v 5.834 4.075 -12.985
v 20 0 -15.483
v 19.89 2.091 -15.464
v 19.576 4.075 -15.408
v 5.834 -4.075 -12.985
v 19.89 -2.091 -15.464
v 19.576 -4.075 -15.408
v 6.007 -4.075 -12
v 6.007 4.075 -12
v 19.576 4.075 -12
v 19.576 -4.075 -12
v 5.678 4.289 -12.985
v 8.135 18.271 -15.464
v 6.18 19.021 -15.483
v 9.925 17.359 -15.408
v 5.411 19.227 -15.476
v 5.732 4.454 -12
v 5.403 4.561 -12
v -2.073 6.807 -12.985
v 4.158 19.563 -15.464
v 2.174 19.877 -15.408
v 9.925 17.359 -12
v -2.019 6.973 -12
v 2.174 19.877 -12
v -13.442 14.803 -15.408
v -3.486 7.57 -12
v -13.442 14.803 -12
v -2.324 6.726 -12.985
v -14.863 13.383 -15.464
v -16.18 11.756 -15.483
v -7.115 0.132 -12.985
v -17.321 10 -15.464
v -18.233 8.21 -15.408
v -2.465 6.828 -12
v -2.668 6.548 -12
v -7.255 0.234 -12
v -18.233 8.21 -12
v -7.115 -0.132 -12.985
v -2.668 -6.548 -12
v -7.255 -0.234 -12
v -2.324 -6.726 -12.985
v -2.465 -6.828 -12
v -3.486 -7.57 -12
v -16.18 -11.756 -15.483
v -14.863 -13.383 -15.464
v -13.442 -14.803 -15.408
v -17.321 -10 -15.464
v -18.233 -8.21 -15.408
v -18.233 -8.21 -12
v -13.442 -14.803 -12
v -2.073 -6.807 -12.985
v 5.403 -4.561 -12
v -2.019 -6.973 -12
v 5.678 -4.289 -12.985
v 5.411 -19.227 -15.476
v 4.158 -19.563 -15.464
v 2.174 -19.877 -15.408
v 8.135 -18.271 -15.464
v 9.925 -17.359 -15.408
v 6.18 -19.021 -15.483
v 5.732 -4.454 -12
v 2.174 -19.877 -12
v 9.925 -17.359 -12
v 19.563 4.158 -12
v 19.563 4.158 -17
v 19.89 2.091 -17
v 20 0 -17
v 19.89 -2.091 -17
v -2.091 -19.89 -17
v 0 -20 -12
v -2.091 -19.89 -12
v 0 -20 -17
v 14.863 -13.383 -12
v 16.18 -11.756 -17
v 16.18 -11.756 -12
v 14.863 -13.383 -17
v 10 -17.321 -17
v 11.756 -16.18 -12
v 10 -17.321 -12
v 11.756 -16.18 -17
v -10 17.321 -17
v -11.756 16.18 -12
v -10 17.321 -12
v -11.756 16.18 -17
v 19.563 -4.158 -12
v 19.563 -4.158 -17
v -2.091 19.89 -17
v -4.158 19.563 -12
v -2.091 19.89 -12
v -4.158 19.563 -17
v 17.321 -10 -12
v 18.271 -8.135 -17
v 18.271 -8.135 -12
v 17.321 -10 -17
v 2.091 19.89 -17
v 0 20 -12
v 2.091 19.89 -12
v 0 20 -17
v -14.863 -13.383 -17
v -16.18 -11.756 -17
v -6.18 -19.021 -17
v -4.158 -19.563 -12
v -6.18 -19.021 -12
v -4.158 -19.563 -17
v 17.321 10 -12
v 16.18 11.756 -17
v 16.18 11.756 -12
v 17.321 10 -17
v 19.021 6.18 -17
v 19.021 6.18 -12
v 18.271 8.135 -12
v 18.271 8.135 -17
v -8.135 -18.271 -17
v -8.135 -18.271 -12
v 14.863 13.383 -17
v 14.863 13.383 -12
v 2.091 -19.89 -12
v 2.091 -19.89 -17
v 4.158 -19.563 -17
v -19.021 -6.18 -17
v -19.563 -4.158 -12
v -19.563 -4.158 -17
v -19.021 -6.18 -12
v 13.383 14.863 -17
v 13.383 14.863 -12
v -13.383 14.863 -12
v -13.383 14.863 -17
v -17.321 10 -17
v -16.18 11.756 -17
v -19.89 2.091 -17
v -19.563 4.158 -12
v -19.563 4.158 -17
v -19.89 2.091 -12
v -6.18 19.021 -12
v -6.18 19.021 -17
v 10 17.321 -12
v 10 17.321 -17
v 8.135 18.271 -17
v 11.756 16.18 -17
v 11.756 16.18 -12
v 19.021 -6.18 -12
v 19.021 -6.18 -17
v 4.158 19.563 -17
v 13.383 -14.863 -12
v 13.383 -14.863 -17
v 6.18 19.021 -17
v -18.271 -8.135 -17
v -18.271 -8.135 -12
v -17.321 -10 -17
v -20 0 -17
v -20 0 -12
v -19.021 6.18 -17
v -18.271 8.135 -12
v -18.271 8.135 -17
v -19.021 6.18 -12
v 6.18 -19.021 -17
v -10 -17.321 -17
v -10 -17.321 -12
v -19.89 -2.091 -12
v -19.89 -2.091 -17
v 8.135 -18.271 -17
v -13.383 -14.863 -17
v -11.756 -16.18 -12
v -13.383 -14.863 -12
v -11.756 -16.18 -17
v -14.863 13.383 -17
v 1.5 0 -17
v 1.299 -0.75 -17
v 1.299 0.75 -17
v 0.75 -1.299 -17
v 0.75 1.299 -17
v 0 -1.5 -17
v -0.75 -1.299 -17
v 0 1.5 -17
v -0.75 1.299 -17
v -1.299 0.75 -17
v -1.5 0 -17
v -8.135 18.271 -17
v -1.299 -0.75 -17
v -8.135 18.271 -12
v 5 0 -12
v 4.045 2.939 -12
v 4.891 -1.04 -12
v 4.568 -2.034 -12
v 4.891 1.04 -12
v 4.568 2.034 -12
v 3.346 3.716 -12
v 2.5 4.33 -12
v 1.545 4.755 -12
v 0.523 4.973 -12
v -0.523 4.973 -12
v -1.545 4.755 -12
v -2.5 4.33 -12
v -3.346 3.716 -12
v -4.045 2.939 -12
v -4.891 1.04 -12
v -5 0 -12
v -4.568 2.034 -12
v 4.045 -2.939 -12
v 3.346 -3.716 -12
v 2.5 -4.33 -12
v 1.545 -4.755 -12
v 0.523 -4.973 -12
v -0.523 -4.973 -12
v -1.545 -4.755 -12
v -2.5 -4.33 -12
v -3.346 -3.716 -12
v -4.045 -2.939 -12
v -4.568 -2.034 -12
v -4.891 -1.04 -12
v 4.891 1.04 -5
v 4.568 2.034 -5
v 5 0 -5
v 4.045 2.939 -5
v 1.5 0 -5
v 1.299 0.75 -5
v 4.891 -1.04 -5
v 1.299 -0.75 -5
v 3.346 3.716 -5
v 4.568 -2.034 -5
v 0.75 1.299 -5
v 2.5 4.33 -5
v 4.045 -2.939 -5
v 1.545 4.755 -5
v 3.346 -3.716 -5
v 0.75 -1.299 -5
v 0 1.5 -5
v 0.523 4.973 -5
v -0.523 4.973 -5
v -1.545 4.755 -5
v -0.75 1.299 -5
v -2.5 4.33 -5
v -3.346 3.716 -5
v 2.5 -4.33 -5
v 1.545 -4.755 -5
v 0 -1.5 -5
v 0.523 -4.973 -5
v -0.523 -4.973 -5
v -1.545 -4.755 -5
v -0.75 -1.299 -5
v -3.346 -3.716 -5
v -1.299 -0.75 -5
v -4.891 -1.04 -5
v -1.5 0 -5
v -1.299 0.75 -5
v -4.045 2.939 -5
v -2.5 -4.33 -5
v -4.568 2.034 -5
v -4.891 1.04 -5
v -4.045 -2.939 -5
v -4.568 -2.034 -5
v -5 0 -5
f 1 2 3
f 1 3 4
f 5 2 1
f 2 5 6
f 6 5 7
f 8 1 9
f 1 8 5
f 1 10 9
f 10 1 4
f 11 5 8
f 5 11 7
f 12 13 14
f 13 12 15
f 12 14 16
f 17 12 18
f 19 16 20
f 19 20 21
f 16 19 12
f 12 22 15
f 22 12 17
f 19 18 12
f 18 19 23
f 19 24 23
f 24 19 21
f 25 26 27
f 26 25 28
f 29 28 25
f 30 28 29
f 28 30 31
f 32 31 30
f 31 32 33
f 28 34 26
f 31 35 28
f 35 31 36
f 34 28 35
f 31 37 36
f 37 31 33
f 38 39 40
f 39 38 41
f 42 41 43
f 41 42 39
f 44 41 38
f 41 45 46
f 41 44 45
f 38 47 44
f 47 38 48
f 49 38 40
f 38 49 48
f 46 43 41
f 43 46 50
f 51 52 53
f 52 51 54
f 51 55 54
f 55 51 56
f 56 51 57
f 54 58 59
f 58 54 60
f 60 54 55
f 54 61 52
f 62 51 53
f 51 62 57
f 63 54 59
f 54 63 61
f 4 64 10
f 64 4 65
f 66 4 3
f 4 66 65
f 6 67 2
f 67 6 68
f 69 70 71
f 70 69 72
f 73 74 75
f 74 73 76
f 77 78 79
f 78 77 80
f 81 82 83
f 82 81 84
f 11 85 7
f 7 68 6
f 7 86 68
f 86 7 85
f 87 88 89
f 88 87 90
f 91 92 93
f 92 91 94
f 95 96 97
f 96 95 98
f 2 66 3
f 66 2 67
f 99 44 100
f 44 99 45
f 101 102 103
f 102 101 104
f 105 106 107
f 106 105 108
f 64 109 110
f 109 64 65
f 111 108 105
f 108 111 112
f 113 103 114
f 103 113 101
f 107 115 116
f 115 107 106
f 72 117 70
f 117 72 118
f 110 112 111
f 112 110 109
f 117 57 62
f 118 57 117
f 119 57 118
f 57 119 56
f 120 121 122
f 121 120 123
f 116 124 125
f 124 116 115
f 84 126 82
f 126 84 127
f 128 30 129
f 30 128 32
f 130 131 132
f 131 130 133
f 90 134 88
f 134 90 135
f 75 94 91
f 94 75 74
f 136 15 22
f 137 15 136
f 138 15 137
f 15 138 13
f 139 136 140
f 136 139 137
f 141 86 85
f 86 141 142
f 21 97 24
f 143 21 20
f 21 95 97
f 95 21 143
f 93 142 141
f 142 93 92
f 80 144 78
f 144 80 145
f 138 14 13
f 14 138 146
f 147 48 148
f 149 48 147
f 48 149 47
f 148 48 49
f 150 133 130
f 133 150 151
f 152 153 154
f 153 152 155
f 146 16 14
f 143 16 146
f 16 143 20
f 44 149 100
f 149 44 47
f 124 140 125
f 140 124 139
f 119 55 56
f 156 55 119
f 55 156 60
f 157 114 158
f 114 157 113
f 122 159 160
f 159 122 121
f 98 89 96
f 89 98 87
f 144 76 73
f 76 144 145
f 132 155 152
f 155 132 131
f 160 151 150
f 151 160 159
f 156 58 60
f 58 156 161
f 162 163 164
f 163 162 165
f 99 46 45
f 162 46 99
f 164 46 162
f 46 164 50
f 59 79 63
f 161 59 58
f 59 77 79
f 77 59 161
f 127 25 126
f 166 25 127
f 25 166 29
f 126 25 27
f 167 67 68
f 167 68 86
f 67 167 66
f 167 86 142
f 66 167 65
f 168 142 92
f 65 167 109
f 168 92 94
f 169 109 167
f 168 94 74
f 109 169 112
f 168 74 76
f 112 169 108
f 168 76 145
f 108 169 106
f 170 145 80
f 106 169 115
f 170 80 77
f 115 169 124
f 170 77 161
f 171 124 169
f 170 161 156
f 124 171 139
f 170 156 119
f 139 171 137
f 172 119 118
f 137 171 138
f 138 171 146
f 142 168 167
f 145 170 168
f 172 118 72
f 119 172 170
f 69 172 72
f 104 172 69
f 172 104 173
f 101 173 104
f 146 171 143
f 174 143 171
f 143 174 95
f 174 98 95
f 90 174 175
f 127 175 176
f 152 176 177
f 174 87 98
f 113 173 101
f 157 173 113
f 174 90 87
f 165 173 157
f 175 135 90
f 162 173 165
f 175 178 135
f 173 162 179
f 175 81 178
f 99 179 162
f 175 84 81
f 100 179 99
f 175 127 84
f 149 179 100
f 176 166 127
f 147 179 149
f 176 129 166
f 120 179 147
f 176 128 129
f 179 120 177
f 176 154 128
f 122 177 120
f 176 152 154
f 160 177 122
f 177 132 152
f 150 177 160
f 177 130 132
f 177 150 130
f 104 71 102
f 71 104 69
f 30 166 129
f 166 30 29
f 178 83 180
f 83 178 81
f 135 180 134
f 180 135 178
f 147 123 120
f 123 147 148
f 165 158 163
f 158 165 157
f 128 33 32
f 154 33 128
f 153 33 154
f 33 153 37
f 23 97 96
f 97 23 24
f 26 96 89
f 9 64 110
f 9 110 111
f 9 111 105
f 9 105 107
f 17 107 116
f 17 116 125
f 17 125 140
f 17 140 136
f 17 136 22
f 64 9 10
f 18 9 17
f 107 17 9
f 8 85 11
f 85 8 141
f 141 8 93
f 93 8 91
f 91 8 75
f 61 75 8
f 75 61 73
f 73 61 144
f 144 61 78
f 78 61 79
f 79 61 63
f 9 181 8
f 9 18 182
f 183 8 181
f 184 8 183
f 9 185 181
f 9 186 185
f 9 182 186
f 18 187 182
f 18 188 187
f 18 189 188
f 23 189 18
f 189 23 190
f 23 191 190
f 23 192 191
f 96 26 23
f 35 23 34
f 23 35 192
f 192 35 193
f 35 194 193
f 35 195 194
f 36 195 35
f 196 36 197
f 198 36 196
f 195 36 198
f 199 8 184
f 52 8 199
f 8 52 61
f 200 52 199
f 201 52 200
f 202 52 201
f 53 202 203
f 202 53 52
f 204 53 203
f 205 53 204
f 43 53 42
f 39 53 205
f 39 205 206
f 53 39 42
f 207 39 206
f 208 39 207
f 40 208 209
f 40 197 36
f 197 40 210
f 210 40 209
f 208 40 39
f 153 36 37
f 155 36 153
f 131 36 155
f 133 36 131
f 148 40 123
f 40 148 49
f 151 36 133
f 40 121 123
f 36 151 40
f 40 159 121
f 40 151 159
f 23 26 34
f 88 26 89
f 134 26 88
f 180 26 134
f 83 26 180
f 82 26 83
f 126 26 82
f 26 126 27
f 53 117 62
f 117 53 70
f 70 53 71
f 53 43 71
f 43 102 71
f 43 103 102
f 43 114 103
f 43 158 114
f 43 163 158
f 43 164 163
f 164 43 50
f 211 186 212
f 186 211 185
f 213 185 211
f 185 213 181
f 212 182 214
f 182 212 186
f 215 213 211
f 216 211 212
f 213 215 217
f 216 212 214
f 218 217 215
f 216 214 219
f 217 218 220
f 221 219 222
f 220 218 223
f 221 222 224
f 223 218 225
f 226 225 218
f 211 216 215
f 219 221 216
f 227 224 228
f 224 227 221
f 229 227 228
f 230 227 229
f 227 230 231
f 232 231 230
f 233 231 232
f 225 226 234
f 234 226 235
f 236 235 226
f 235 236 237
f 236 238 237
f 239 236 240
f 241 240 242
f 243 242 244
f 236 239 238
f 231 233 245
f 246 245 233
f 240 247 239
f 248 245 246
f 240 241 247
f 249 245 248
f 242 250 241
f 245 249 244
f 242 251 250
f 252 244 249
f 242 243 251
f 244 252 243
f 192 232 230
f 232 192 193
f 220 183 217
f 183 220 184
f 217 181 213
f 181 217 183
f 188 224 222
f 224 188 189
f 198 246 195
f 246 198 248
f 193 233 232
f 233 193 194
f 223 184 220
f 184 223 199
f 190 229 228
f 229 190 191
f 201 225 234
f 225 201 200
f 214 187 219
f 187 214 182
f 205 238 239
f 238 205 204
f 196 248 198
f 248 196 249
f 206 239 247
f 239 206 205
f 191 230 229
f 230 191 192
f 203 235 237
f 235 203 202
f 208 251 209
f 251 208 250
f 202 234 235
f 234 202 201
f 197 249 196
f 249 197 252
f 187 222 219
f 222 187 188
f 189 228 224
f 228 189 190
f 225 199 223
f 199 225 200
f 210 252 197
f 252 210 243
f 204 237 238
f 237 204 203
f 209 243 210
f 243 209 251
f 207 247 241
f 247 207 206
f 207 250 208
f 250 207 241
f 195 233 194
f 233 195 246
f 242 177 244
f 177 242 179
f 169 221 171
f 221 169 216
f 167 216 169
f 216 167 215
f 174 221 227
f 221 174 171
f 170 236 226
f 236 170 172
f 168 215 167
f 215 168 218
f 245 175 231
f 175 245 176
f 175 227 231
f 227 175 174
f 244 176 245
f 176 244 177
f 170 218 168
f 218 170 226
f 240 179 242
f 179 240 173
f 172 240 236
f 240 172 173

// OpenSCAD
angle=10;
offset=-2;

difference(){
translate([0,0,offset])
cylinder(d=40,h=30,$fn=60,center=true);
cylinder(d=3.7,h=60,$fn=15,center=true);
for(i=[0:72:330]){
rotate([0,0,i])
rotate([0,angle,0])translate([20,0,0])
cube([24,8.15,23.55],center=true);
}
translate([0,0,-12])cylinder(d=50,h=30);
}
difference(){
translate([0,0,-17])cylinder(d=10,h=12,$fn=30);
cylinder(d=3,h=100,$fn=12,center=true);
}

//difference(){
//translate([0,0,offset])
//cylinder(d=40,h=28,$fn=60,center=true);
//cylinder(d=3.7,h=60,$fn=15,center=true);
//for(i=[0:72:330]){
//rotate([0,0,i])
//rotate([0,angle,0])translate([20,0,0])
//cube([24,8.15,23.55],center=true);
//}
//translate([0,0,-23])cylinder(d=50,h=30);
//}

%rotate([0,angle,0])translate([20,0,0])
cube([24,8.15,23.55],center=true);
